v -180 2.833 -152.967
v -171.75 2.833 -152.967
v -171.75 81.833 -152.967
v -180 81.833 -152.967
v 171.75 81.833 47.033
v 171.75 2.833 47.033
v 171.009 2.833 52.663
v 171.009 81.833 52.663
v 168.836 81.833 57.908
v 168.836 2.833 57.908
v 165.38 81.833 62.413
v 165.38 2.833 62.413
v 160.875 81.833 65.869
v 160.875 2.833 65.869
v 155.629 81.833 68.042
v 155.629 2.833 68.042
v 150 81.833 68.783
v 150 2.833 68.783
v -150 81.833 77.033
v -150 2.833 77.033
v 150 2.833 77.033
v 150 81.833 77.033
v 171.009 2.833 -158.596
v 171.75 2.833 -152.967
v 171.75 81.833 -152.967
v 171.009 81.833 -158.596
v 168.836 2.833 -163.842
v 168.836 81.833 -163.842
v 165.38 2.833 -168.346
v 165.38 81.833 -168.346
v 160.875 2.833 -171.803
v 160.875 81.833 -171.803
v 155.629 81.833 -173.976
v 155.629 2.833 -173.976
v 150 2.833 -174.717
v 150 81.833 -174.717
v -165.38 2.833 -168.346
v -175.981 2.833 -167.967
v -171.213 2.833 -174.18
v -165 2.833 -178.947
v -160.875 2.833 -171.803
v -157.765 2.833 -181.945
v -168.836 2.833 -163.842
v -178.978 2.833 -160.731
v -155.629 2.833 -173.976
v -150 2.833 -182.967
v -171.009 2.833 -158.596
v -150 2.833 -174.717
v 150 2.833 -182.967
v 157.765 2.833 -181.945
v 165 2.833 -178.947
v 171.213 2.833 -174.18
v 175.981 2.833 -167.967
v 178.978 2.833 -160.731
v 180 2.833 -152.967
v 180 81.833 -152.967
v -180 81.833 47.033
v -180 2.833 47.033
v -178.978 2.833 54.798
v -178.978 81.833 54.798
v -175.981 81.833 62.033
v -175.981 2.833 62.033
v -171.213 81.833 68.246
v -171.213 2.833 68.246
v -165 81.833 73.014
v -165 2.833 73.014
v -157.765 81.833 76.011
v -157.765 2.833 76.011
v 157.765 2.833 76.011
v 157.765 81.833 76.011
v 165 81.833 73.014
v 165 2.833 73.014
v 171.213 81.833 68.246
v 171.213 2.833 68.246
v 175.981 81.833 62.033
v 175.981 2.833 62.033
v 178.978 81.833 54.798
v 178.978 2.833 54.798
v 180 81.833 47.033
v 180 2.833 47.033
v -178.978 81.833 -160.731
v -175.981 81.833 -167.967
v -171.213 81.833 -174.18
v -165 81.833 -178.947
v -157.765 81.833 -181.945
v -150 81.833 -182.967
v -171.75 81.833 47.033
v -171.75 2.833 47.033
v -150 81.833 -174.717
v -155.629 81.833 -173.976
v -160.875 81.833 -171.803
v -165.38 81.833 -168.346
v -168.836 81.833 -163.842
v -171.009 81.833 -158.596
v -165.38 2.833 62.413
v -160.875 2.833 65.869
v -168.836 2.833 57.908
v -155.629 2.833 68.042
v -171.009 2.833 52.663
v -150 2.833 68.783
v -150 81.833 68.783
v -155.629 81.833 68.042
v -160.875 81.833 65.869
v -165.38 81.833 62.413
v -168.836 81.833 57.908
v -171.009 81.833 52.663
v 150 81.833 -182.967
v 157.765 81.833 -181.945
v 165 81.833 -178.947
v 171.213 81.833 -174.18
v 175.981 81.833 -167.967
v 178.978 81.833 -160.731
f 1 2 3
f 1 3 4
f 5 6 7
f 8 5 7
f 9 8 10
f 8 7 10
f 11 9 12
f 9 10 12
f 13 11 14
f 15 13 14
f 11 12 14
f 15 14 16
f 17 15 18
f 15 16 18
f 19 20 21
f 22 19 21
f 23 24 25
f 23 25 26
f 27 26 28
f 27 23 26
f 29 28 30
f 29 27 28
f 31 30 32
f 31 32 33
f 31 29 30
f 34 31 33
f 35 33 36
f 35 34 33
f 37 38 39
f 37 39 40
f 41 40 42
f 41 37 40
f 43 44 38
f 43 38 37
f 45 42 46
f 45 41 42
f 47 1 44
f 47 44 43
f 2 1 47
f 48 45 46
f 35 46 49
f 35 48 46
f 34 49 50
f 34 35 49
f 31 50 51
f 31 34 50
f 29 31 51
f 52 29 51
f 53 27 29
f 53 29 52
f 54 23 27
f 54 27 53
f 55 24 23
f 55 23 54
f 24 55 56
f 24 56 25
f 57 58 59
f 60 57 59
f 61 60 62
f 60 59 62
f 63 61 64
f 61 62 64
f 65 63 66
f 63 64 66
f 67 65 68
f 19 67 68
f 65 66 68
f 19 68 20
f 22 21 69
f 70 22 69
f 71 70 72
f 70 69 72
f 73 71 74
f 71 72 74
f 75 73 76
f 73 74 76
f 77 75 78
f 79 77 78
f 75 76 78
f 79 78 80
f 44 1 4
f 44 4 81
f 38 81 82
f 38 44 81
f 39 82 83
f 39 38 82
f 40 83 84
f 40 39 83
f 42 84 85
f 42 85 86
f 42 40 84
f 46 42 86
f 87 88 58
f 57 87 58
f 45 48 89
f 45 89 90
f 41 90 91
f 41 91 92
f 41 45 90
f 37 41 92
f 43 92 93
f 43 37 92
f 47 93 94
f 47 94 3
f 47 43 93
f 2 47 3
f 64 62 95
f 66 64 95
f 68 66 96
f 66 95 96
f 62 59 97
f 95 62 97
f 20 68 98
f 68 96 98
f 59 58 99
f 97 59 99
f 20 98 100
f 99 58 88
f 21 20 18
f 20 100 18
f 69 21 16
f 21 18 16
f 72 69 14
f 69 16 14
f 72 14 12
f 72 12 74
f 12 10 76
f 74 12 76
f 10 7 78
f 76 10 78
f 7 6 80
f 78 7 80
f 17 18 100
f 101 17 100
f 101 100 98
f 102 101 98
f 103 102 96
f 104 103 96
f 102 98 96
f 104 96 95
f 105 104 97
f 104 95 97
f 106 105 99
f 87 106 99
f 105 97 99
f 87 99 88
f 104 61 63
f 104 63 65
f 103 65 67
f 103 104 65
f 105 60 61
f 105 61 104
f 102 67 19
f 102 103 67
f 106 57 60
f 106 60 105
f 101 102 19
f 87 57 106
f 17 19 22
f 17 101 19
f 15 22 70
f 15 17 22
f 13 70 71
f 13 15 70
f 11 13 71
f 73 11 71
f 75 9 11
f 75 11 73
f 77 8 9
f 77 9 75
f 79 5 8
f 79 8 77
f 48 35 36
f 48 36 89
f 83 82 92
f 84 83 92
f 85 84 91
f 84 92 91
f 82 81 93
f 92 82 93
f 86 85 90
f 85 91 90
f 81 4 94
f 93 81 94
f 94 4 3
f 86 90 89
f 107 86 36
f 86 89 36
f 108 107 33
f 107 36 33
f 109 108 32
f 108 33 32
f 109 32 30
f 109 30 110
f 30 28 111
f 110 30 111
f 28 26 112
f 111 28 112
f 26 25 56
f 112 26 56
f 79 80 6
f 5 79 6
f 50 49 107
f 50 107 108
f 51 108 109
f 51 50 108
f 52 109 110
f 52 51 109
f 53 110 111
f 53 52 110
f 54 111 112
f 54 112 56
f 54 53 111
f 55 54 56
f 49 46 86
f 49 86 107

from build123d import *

# Parameters (mm, degrees)
BOSS_EXTRUDE1_DEPTH      = 16
BOSS_EXTRUDE2_DEPTH      = 46.583974855
BOSS_EXTRUDE2_DEPTH_BACK = 46.58397486
SKETCH4_R                = 3.3
CUT_EXTRUDE1_DEPTH       = 32.2
CUT_EXTRUDE1_DEPTH_BACK  = 32.2
SKETCH5_R                = 3.3
SKETCH6_W                = 20
SKETCH6_H                = 11
BOSS_EXTRUDE3_DEPTH      = 30
CUT_EXTRUDE2_DEPTH       = 233.824504724
CUT_EXTRUDE2_DEPTH_BACK  = 233.824504724
SKETCH7_R                = 2
SKETCH8_W                = 40
SKETCH8_H                = 11
CUT_EXTRUDE3_DEPTH       = 40
SKETCH9_R                = 2
CUT_EXTRUDE4_DEPTH       = 40
FILLET1_R                = 20
BOSS_EXTRUDE4_DEPTH      = 52.66666667
SKETCH11_W               = 287.599331825
SKETCH11_H               = 200.78083169
CUT_EXTRUDE5_DEPTH       = 16
SCALE1_START             = 16
SCALE1_DEPTH             = 52.66666667
SCALE1_START_2           = 2.833333333
SCALE1_2_DEPTH           = 79.000000004
SKETCH15_W               = 527.18296214
SKETCH15_H               = 284.392361206
CUT_EXTRUDE9_DEPTH       = 200


# Read off the part's stored shape, not the designer's step: Scale1
with BuildPart() as part:
    # Sketch1 → Boss-Extrude1 (new body)
    with BuildSketch(Plane(origin=(0, 0, 0), x_dir=(1, 0, 0), z_dir=(0, 1, 0))):
        Polygon((-120, -37.5), (-120, -75), (0, -75), (0, 75), (-120, 75), (-120, 37.5), (-220, 37.5), (-220, -37.5), align=None)
    extrude(amount=BOSS_EXTRUDE1_DEPTH)

    # Sketch4 → Boss-Extrude2 (add, two sides: drawn at the far end of the back side and taken through both)
    # profile 1 of 2: a face of its own
    with BuildSketch(Plane.ZY.offset(170).offset(-BOSS_EXTRUDE2_DEPTH_BACK)):
        with BuildLine():
            Line((37.5, 16), (43.5, 16))
            ThreePointArc((43.5, 16), (51.5, 8), (43.5, 0))
            Line((43.5, 0), (37.5, 0))
            Line((37.5, 0), (37.5, 16))
        make_face()
        with Locations((43.5, 8)):
            Circle(SKETCH4_R, mode=Mode.SUBTRACT)
    # profile 2 of 2: a face of its own
    with BuildSketch(Plane.ZY.offset(170).offset(-BOSS_EXTRUDE2_DEPTH_BACK)):
        with BuildLine():
            Line((-37.5, 0), (-43.5, 0))
            ThreePointArc((-43.5, 0), (-51.5, 8), (-43.5, 16))
            Line((-43.5, 16), (-37.5, 16))
            Line((-37.5, 16), (-37.5, 0))
        make_face()
        with Locations((-43.5, 8)):
            Circle(SKETCH4_R, mode=Mode.SUBTRACT)
    extrude(amount=BOSS_EXTRUDE2_DEPTH + BOSS_EXTRUDE2_DEPTH_BACK)

    # Sketch5 → Cut-Extrude1 (cut, two sides: drawn at the far end of the back side and taken through both)
    # profile 1 of 2: a face of its own
    with BuildSketch(Plane.ZY.offset(170).offset(-CUT_EXTRUDE1_DEPTH_BACK)):
        with BuildLine():
            Line((-43.5, 16), (-37.5, 16))
            Line((-37.5, 16), (-37.5, 0))
            Line((-37.5, 0), (-43.5, 0))
            ThreePointArc((-43.5, 0), (-51.5, 8), (-43.5, 16))
        make_face()
        with Locations((-43.5, 8)):
            Circle(SKETCH5_R, mode=Mode.SUBTRACT)
    # profile 2 of 2: a face of its own
    with BuildSketch(Plane.ZY.offset(170).offset(-CUT_EXTRUDE1_DEPTH_BACK)):
        with BuildLine():
            Line((37.5, 0), (43.5, 0))
            ThreePointArc((43.5, 0), (51.5, 8), (43.5, 16))
            Line((43.5, 16), (37.5, 16))
            Line((37.5, 16), (37.5, 0))
        make_face()
        with Locations((43.5, 8)):
            Circle(SKETCH5_R, mode=Mode.SUBTRACT)
    extrude(amount=CUT_EXTRUDE1_DEPTH + CUT_EXTRUDE1_DEPTH_BACK, mode=Mode.SUBTRACT)

    # Sketch6 → Boss-Extrude3 (add)
    with BuildSketch(Plane(origin=(0, 0, 0), x_dir=(0, 0, -1), z_dir=(1, 0, 0))):
        with Locations((-50, 8)):
            Rectangle(SKETCH6_W, SKETCH6_H)
        with Locations((50, 8)):
            Rectangle(SKETCH6_W, SKETCH6_H)
    extrude(amount=BOSS_EXTRUDE3_DEPTH)

    # Sketch7 → Cut-Extrude2 (cut, two sides: drawn at the far end of the back side and taken through both)
    with BuildSketch(Plane(origin=(0, 13.5, 0), x_dir=(1, 0, 0), z_dir=(0, 1, 0)).offset(-CUT_EXTRUDE2_DEPTH_BACK)):
        with Locations(Location((22.5, 50, 0), (0, 0, 270))):
            Circle(SKETCH7_R)
        with Locations(Location((22.5, -50, 0), (0, 0, 270))):
            Circle(SKETCH7_R)
    extrude(amount=CUT_EXTRUDE2_DEPTH + CUT_EXTRUDE2_DEPTH_BACK, mode=Mode.SUBTRACT)

    # Sketch8 → Cut-Extrude3 (cut)
    with BuildSketch(Plane(origin=(0, 0, 0), x_dir=(0, 0, -1), z_dir=(1, 0, 0))):
        with Locations((0, 8)):
            Rectangle(SKETCH8_W, SKETCH8_H)
    extrude(amount=-CUT_EXTRUDE3_DEPTH, mode=Mode.SUBTRACT)

    # Sketch9 → Cut-Extrude4 (cut)
    with BuildSketch(Plane(origin=(0, 16, 0), x_dir=(1, 0, 0), z_dir=(0, 1, 0))):
        with Locations(Location((-32.5, 0, 0), (0, 0, 270))):
            Circle(SKETCH9_R)
    extrude(amount=-CUT_EXTRUDE4_DEPTH, mode=Mode.SUBTRACT)

    # Fillet1
    # the kernel refuses this fillet: 20 mm, written as the material it takes off along each edge
    with BuildSketch(Plane(origin=(-220, -27.947694226, -37.5), x_dir=(0, 0, 1), z_dir=(0, 1, 0))) as fillet1_piece_1:
        with BuildLine():
            CenterArc((11.17907769, 20), FILLET1_R, 236.01651728, 33.98348272)
            Line((0, 3.416025145), (-0.223581554, 3.084345648))
            ThreePointArc((-0.223581554, 3.084345648), (-0.4, 1.708012572), (-0.4, 0))
            Line((-0.4, 0), (0, -0.4))
            Line((0, -0.4), (11.17907769, -0.4))
            Line((11.17907769, -0.4), (11.17907769, 0))
        make_face()
    extrude(amount=71.895388452, mode=Mode.SUBTRACT)
    with BuildSketch(Plane(origin=(-220, -27.947694226, 37.5), x_dir=(1, 0, 0), z_dir=(0, 1, 0))) as fillet1_piece_2:
        with BuildLine():
            CenterArc((20, 11.17907769), FILLET1_R, 180, 33.98348272)
            Line((0, 11.17907769), (-0.4, 11.17907769))
            Line((-0.4, 11.17907769), (-0.4, 0))
            Line((-0.4, 0), (0, -0.4))
            ThreePointArc((0, -0.4), (1.708012572, -0.4), (3.084345648, -0.223581554))
            Line((3.084345648, -0.223581554), (3.416025145, 0))
        make_face()
    extrude(amount=71.895388452, mode=Mode.SUBTRACT)
    with BuildSketch(Plane(origin=(-120, -50, -75), x_dir=(1, 0, 0), z_dir=(0, 1, 0)), Plane(origin=(-120, -50, 75), x_dir=(0, 0, -1), z_dir=(0, 1, 0))) as fillet1_piece_3:
        with BuildLine():
            CenterArc((FILLET1_R, -FILLET1_R), FILLET1_R, 90, 90)
            Line((0, -FILLET1_R), (-FILLET1_R * 0.02, -FILLET1_R))
            Line((-FILLET1_R * 0.02, -FILLET1_R), (-FILLET1_R * 0.02, FILLET1_R * 0.02))
            Line((-FILLET1_R * 0.02, FILLET1_R * 0.02), (FILLET1_R, FILLET1_R * 0.02))
            Line((FILLET1_R, FILLET1_R * 0.02), (FILLET1_R, 0))
        make_face()
    extrude(amount=116, mode=Mode.SUBTRACT)

    # Sketch10 → Boss-Extrude4 (add)
    with BuildSketch(Plane(origin=(0, 16, 0), x_dir=(1, 0, 0), z_dir=(0, 1, 0))):
        with BuildLine():
            Line((0, 69.5), (-100, 69.5))
            ThreePointArc((-100, 69.5), (-110.253048327, 65.253048327), (-114.5, 55))
            Line((-114.5, 55), (-120, 55))
            ThreePointArc((-120, 55), (-114.142135624, 69.142135624), (-100, 75))
            Line((-100, 75), (0, 75))
            Line((0, 75), (100, 75))
            ThreePointArc((100, 75), (114.142135624, 69.142135624), (120, 55))
            Line((120, 55), (114.5, 55))
            ThreePointArc((114.5, 55), (110.253048327, 65.253048327), (100, 69.5))
            Line((100, 69.5), (0, 69.5))
        make_face()
        with BuildLine():
            Line((0, -75), (100, -75))
            ThreePointArc((100, -75), (114.142135624, -69.142135624), (120, -55))
            Line((120, -55), (114.5, -55))
            ThreePointArc((114.5, -55), (110.253048327, -65.253048327), (100, -69.5))
            Line((100, -69.5), (0, -69.5))
            Line((0, -69.5), (-100, -69.5))
            ThreePointArc((-100, -69.5), (-110.253048327, -65.253048327), (-114.5, -55))
            Line((-114.5, -55), (-120, -55))
            ThreePointArc((-120, -55), (-114.142135624, -69.142135624), (-100, -75))
            Line((-100, -75), (0, -75))
        make_face()
    extrude(amount=BOSS_EXTRUDE4_DEPTH)

    # Sketch11 → Cut-Extrude5 (cut)
    with BuildSketch(Plane.XZ):
        with Locations((-109.164099046, 3.949352656)):
            Rectangle(SKETCH11_W, SKETCH11_H)
    extrude(amount=-CUT_EXTRUDE5_DEPTH, mode=Mode.SUBTRACT)


with BuildPart() as cut_extrude5_piece_1:
    # of the separate pieces the step leaves, piece 1, a body of its own (cut_extrude5_pieces)
    add(part.part.solids().sort_by_distance((-100, 16, 75))[0])


with BuildPart() as cut_extrude5_piece_2:
    # of the separate pieces the step leaves, piece 2, a body of its own (cut_extrude5_pieces)
    add(part.part.solids().sort_by_distance((-114.5, 16, -55))[0])


with BuildPart() as scale1_tool:
    # Scale1 outline → Scale1 (new body)
    with BuildSketch(Plane(origin=(0, 0, 0), x_dir=(1, 0, 0), z_dir=(0, 1, 0)).offset(SCALE1_START)):
        with BuildLine():
            Line((104.502391105, -68.783267912), (114.492119434, -68.783267912))
            ThreePointArc((114.492119434, -68.783267912), (118.572054123, -62.421509662), (120, -55))
            Line((120, -55), (114.5, -55))
            ThreePointArc((114.5, -55), (111.737433088, -63.513675146), (104.502391105, -68.783267912))
        make_face()
        with BuildLine():
            Line((-114.492119434, -68.783267912), (-104.502391105, -68.783267912))
            ThreePointArc((-104.502391105, -68.783267912), (-111.737433088, -63.513675146), (-114.5, -55))
            Line((-114.5, -55), (-120, -55))
            ThreePointArc((-120, -55), (-118.572054123, -62.421509662), (-114.492119434, -68.783267912))
        make_face()
        with BuildLine():
            Line((-104.502391105, 68.783267912), (-114.492119434, 68.783267912))
            ThreePointArc((-114.492119434, 68.783267912), (-118.572054123, 62.421509662), (-120, 55))
            Line((-120, 55), (-114.5, 55))
            ThreePointArc((-114.5, 55), (-111.737433088, 63.513675146), (-104.502391105, 68.783267912))
        make_face()
        with BuildLine():
            ThreePointArc((120, 55), (118.572054123, 62.421509662), (114.492119434, 68.783267912))
            Line((114.492119434, 68.783267912), (104.502391105, 68.783267912))
            ThreePointArc((104.502391105, 68.783267912), (111.737433088, 63.513675146), (114.5, 55))
            Line((114.5, 55), (120, 55))
        make_face()
    extrude(amount=SCALE1_DEPTH)


with BuildPart() as cut_extrude5_piece_1_1:
    add(cut_extrude5_piece_1.part)

    # Scale1: cut by scale1_tool
    add(scale1_tool.part, mode=Mode.SUBTRACT)



with BuildPart() as cut_extrude5_piece_2_1:
    add(cut_extrude5_piece_2.part)

    # Scale1: cut by scale1_tool
    add(scale1_tool.part, mode=Mode.SUBTRACT)


with BuildPart() as cut_extrude5_piece_1_2:
    add(cut_extrude5_piece_1_1.part)

    add(cut_extrude5_piece_2_1.part)  # Scale1 2 merges Cut-Extrude5 piece 2
    # Scale1 2 outline → Scale1 2 (add)
    with BuildSketch(Plane(origin=(0, 0, 0), x_dir=(1, 0, 0), z_dir=(0, 1, 0)).offset(SCALE1_START_2)):
        with BuildLine():
            Line((180, -47.033267912), (171.75, -47.033267912))
            ThreePointArc((171.75, -47.033267912), (165.379572491, -62.412840403), (150, -68.783267912))
            Line((150, -68.783267912), (-150, -68.783267912))
            ThreePointArc((-150, -68.783267912), (-165.379572491, -62.412840403), (-171.75, -47.033267912))
            Line((-171.75, -47.033267912), (-180, -47.033267912))
            ThreePointArc((-180, -47.033267912), (-171.213203436, -68.246471348), (-150, -77.033267912))
            Line((-150, -77.033267912), (150, -77.033267912))
            ThreePointArc((150, -77.033267912), (171.213203436, -68.246471348), (180, -47.033267912))
        make_face()
        with BuildLine():
            Line((150, 77.033267912), (-150, 77.033267912))
            ThreePointArc((-150, 77.033267912), (-171.213203436, 68.246471348), (-180, 47.033267912))
            Line((-180, 47.033267912), (-171.75, 47.033267912))
            ThreePointArc((-171.75, 47.033267912), (-165.379572491, 62.412840403), (-150, 68.783267912))
            Line((-150, 68.783267912), (150, 68.783267912))
            ThreePointArc((150, 68.783267912), (165.379572491, 62.412840403), (171.75, 47.033267912))
            Line((171.75, 47.033267912), (180, 47.033267912))
            ThreePointArc((180, 47.033267912), (171.213203436, 68.246471348), (150, 77.033267912))
        make_face()
    extrude(amount=SCALE1_2_DEPTH)

    # Sketch15 → Cut-Extrude9 (cut)
    with BuildSketch(Plane.XY):
        with Locations((-4.944471508, 47.534491158)):
            Rectangle(SKETCH15_W, SKETCH15_H)
    extrude(amount=-CUT_EXTRUDE9_DEPTH, mode=Mode.SUBTRACT)


with BuildPart() as body_2:
    # Mirror8: mirrored copy
    add(cut_extrude5_piece_1_2.part.mirror(Plane.XY.offset(-52.966732088)))


solid = Compound([cut_extrude5_piece_1_2.part, body_2.part])
